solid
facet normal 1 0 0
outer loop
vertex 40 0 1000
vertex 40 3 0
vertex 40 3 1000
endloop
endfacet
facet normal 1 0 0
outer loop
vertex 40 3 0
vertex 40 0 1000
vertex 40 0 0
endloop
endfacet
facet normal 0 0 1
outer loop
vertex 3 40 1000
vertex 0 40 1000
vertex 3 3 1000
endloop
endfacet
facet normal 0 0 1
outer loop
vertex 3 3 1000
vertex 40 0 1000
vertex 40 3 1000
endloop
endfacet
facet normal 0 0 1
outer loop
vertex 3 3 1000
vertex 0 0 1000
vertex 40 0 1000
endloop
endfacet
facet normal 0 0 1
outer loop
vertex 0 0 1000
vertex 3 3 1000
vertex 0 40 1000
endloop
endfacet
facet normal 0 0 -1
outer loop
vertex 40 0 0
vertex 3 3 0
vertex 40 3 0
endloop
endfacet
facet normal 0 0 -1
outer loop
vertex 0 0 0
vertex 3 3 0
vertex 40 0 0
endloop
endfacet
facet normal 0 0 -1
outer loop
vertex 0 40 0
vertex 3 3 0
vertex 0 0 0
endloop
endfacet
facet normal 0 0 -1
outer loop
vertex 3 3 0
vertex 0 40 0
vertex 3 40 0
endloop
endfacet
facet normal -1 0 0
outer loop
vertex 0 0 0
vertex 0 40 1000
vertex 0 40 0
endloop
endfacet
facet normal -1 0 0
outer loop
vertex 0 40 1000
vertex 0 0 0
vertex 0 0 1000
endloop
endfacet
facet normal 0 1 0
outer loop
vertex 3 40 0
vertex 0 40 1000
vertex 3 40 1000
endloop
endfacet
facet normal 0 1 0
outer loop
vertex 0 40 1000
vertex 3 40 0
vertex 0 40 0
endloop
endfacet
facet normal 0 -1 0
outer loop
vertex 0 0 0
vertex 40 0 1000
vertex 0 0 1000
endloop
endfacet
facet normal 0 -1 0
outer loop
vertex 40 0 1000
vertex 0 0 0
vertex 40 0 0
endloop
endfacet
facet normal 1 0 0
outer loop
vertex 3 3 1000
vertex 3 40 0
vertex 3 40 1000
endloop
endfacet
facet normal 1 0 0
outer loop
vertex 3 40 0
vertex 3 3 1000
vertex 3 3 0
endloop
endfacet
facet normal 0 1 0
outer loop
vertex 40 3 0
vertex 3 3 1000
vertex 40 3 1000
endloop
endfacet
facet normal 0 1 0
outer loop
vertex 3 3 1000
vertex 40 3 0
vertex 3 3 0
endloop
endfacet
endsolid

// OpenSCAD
// file: metal_profiles_params.scad
// F-Roof: A multi-function single-layer roof
// https://github.com/f-roof
// Author: Mihai Oltean; https://tcreate.org
//---------------------------------------------------------------------------------------
T_profile_thick_40 = 4;
T_profile_thick_50 = 5;
//---------------------------------------------------------------------------------------
// main file
// F-Roof: A multi-function single-layer roof
// https://github.com/f-roof

// Maker: Mihai Oltean
// https://mihaioltean.github.io
//---------------------------------------------------------------------------------------
include <metal_profiles_params.scad>
//---------------------------------------------------------------------------------------
module L_profile(length, W, thick = 3)
{
    color("gray") 
    difference(){
        cube([W, W, length]);
        translate ([thick, thick, 0] - [0,0,1]) cube([W - thick + 1, W - thick + 1, length] + [0, 0, 2]);
    }
}
//---------------------------------------------------------------------------------------
module rectangular_tube(length, H, W, thick = 3)
{
    color("gray") 
    difference(){
        cube([W, H, length]);
        translate ([thick, thick, 0] - [0,0,1]) cube([W - 2*thick, H - 2*thick, length] + [0, 0, 2]);
    }
}
//---------------------------------------------------------------------------------------
module T_40_4(length)
{
color("black")
    translate ([0, -20, 0]){
        difference(){
        // base wall
        
            cube([length, 40, T_profile_thick_40]);
            /*
            for (k = [0 : 6]){
                translate ([k * distance_between_capriori + caprior_side_small / 2, 10, 0]) cylinder(h = T_profile_thick + 2, r = 4);
                translate ([k * distance_between_capriori + caprior_side_small / 2, 30, 0]) cylinder(h = T_profile_thick + 2, r = 4);
            }
            */
        }
        // vertical wall
        translate ([0, 20 - T_profile_thick_40 / 2, 0]) cube([length, T_profile_thick_40, 40]);
    }
}
//---------------------------------------------------------------------------------------

//T_40_4(1000);

//rectangular_tube(100, 80, 40);
L_profile(1000, 40, 3);
